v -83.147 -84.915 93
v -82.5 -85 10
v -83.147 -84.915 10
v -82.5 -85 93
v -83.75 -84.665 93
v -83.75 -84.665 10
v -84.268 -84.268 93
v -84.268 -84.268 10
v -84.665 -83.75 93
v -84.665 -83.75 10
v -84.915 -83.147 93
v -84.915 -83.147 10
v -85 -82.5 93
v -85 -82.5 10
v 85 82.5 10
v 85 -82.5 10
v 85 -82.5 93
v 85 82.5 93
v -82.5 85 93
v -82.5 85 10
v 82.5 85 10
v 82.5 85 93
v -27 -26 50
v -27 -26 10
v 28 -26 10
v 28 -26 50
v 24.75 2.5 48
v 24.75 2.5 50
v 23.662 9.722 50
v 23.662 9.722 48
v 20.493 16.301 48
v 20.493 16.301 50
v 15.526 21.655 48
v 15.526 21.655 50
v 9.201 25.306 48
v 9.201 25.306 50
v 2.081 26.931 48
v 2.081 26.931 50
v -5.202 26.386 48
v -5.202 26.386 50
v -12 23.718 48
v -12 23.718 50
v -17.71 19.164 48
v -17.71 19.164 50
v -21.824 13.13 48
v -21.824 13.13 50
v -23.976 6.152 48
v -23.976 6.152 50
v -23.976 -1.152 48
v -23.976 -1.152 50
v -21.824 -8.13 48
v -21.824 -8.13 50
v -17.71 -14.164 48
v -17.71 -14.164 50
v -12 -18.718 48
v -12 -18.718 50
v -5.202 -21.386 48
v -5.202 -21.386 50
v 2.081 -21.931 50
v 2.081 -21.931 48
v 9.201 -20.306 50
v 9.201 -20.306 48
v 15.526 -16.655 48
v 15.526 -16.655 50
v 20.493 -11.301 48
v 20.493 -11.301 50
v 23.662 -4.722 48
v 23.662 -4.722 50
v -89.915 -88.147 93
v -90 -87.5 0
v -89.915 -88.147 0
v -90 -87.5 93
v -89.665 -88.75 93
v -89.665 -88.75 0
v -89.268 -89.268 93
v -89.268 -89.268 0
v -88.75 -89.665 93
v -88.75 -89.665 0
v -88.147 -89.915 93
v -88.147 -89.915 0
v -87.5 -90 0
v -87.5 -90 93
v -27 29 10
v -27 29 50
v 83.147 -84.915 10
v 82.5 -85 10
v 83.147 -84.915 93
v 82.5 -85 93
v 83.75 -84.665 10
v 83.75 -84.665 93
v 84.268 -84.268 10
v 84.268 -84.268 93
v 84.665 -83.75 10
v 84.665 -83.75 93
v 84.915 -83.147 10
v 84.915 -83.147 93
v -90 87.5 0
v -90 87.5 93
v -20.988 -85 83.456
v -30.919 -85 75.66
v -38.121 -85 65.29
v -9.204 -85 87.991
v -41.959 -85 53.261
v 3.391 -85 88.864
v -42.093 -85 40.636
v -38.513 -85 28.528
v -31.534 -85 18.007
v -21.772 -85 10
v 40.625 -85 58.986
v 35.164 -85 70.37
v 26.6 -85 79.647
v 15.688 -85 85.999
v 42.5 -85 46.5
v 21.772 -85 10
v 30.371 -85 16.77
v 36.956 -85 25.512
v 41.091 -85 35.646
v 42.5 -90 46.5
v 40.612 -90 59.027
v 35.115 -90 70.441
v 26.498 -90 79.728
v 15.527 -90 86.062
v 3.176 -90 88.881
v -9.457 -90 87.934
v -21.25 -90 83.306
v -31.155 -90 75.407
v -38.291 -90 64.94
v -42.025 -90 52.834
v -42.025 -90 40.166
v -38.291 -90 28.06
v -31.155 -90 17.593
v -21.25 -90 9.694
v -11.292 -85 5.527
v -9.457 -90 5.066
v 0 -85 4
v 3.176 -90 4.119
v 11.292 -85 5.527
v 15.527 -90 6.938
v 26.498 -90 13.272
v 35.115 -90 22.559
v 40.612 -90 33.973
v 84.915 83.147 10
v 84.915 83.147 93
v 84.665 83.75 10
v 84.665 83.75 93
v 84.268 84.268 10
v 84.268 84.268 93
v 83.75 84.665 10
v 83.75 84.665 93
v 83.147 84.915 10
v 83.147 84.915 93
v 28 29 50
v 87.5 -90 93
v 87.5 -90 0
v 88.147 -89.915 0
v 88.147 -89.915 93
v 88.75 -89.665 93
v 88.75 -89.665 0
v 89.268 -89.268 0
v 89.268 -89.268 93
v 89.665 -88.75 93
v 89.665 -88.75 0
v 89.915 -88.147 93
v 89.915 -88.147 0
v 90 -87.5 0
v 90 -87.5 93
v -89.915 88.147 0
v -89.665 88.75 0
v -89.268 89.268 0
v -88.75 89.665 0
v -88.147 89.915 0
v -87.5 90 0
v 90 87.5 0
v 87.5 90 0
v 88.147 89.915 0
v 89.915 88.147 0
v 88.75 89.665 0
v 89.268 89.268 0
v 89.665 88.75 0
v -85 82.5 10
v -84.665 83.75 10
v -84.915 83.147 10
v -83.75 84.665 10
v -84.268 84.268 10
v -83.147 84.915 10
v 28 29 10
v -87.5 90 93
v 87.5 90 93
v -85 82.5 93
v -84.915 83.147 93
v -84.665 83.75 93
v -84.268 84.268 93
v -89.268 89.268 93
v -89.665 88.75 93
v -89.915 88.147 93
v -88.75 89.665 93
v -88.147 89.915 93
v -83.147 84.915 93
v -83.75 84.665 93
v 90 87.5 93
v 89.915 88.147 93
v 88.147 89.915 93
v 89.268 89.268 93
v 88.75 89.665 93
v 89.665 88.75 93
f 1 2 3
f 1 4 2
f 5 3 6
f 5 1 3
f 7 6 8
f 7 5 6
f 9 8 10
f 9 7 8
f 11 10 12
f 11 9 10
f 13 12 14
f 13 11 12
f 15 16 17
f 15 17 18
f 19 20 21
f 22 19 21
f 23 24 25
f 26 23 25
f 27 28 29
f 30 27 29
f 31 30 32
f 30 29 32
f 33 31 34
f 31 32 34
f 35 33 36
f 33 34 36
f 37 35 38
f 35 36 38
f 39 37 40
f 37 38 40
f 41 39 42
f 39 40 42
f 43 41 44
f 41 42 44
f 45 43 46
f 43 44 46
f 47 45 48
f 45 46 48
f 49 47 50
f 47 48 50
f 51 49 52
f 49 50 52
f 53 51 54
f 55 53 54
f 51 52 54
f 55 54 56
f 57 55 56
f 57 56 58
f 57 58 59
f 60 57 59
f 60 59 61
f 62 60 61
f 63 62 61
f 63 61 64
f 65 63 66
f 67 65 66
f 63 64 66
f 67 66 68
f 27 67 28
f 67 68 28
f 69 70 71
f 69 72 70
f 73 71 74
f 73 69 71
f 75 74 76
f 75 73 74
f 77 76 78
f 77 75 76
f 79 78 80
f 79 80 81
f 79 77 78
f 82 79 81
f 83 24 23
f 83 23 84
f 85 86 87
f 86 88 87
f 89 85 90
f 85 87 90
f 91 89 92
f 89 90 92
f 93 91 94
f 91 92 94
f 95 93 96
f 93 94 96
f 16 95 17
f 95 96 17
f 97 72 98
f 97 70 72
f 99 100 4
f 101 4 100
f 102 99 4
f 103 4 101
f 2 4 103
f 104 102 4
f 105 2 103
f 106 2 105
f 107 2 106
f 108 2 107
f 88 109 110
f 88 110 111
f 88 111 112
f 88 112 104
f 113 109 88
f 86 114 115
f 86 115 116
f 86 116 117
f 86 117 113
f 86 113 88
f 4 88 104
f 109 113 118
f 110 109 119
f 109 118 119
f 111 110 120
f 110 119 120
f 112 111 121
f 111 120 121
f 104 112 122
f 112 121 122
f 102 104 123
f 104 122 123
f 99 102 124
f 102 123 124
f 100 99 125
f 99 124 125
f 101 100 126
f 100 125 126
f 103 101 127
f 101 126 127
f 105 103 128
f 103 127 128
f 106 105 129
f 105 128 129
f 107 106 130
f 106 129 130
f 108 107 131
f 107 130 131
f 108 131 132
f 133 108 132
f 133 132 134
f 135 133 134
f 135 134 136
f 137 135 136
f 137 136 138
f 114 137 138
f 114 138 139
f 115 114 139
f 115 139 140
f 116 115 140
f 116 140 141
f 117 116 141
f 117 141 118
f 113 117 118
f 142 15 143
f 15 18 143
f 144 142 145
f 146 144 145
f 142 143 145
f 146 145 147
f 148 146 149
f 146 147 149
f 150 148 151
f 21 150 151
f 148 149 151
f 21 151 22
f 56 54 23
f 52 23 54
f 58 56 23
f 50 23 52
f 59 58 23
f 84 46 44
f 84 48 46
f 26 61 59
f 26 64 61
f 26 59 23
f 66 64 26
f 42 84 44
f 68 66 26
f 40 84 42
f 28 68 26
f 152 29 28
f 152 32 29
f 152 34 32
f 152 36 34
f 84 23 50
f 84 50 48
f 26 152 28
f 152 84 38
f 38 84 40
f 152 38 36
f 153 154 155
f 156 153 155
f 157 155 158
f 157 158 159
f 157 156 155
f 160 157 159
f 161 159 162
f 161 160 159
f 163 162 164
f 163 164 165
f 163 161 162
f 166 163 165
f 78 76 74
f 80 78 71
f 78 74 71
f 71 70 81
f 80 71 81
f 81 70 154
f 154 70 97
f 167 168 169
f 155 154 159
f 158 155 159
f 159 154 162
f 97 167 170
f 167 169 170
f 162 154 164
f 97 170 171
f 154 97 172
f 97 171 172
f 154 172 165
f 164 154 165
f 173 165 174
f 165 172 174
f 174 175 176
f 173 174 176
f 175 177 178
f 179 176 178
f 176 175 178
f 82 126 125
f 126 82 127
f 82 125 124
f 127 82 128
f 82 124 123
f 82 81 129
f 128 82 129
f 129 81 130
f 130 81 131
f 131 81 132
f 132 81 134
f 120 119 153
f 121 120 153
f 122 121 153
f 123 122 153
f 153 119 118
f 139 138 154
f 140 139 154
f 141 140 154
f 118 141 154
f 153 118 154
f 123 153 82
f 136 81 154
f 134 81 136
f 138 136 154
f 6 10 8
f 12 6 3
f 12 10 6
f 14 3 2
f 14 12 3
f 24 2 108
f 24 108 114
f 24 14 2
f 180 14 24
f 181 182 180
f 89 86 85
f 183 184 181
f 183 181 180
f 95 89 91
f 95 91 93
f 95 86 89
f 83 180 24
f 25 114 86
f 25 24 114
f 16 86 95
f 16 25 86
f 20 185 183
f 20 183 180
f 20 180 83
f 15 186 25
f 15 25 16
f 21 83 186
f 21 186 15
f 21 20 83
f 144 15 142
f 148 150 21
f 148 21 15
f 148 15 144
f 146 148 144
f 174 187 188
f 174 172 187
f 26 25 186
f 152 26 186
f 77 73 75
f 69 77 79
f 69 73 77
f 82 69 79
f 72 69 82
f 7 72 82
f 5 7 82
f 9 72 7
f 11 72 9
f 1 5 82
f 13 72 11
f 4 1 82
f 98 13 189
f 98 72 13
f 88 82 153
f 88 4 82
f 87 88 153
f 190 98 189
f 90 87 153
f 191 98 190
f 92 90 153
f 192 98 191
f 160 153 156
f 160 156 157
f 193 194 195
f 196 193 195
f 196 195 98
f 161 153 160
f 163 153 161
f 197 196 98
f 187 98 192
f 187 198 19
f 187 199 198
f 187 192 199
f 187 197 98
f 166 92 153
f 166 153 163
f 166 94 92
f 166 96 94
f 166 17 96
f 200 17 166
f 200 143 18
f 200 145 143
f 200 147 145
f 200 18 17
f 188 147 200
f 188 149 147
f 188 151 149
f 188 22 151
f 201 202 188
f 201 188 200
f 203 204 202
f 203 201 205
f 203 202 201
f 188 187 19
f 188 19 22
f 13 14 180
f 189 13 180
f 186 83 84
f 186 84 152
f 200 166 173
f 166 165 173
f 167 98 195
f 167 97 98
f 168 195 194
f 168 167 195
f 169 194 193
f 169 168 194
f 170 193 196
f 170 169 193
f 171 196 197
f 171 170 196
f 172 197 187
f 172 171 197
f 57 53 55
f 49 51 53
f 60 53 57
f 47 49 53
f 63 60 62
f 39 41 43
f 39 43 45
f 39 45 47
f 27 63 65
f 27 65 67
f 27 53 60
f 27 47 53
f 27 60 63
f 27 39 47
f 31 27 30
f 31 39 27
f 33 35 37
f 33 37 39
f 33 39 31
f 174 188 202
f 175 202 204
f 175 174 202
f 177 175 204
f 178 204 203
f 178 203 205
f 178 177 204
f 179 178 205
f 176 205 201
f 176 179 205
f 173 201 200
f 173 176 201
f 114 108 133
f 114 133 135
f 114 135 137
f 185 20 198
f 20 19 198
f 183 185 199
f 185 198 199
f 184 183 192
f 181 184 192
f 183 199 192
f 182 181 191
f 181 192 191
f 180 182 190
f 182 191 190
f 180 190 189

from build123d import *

# Parameters (mm, degrees)
F0_W     = 180
F0_H     = 180
F1_DEPTH = 10
F2_W     = 55
F2_H     = 55
F3_DEPTH = 40
F4_W     = 180
F4_H     = 180
F4_W_2   = 170
F4_H_2   = 170
F5_DEPTH = 83
F6_R     = 24.5
F7_DEPTH = 2
F8_R     = 42.5
F9_DEPTH = 5
F10_R    = 2.5
F11_R    = 2.5


with BuildPart() as f1:
    # F0 (on Top) → F1 (new body)
    with BuildSketch(Plane.XY):
        Rectangle(F0_W, F0_H)
    extrude(amount=F1_DEPTH)

    # F2 (on face) → F3 (join)
    with BuildSketch(Plane.XY.offset(10)):
        with Locations((0.5, 1.5)):
            Rectangle(F2_W, F2_H)
    extrude(amount=F3_DEPTH)

    # F4 (on face) → F5 (join)
    with BuildSketch(Plane.XY.offset(10)):
        Rectangle(F4_W, F4_H)
        Rectangle(F4_W_2, F4_H_2, mode=Mode.SUBTRACT)
    extrude(amount=F5_DEPTH)

    # F6 (on face) → F7 (cut)
    with BuildSketch(Plane.XY.offset(50)):
        with Locations((0.25, 2.5)):
            Circle(F6_R)
    extrude(amount=-F7_DEPTH, mode=Mode.SUBTRACT)

    # F8 (on face) → F9 (cut)
    with BuildSketch(Plane.XZ.offset(90)):
        with Locations((0, 46.5)):
            Circle(F8_R)
    extrude(amount=-F9_DEPTH, mode=Mode.SUBTRACT)

    # F10
    f10_edges = [f1.edges().sort_by_distance(p)[0] for p in [
        (90, 90, 46.5),
        (-90, 90, 46.5),
        (90, -90, 46.5),
        (-90, -90, 46.5),
    ]]
    fillet(f10_edges, radius=F10_R)

    # F11
    f11_edges = [f1.edges().sort_by_distance(p)[0] for p in [
        (-85, 85, 51.5),
        (85, 85, 51.5),
        (-85, -85, 51.5),
        (85, -85, 51.5),
    ]]
    fillet(f11_edges, radius=F11_R)


solid = f1.part
